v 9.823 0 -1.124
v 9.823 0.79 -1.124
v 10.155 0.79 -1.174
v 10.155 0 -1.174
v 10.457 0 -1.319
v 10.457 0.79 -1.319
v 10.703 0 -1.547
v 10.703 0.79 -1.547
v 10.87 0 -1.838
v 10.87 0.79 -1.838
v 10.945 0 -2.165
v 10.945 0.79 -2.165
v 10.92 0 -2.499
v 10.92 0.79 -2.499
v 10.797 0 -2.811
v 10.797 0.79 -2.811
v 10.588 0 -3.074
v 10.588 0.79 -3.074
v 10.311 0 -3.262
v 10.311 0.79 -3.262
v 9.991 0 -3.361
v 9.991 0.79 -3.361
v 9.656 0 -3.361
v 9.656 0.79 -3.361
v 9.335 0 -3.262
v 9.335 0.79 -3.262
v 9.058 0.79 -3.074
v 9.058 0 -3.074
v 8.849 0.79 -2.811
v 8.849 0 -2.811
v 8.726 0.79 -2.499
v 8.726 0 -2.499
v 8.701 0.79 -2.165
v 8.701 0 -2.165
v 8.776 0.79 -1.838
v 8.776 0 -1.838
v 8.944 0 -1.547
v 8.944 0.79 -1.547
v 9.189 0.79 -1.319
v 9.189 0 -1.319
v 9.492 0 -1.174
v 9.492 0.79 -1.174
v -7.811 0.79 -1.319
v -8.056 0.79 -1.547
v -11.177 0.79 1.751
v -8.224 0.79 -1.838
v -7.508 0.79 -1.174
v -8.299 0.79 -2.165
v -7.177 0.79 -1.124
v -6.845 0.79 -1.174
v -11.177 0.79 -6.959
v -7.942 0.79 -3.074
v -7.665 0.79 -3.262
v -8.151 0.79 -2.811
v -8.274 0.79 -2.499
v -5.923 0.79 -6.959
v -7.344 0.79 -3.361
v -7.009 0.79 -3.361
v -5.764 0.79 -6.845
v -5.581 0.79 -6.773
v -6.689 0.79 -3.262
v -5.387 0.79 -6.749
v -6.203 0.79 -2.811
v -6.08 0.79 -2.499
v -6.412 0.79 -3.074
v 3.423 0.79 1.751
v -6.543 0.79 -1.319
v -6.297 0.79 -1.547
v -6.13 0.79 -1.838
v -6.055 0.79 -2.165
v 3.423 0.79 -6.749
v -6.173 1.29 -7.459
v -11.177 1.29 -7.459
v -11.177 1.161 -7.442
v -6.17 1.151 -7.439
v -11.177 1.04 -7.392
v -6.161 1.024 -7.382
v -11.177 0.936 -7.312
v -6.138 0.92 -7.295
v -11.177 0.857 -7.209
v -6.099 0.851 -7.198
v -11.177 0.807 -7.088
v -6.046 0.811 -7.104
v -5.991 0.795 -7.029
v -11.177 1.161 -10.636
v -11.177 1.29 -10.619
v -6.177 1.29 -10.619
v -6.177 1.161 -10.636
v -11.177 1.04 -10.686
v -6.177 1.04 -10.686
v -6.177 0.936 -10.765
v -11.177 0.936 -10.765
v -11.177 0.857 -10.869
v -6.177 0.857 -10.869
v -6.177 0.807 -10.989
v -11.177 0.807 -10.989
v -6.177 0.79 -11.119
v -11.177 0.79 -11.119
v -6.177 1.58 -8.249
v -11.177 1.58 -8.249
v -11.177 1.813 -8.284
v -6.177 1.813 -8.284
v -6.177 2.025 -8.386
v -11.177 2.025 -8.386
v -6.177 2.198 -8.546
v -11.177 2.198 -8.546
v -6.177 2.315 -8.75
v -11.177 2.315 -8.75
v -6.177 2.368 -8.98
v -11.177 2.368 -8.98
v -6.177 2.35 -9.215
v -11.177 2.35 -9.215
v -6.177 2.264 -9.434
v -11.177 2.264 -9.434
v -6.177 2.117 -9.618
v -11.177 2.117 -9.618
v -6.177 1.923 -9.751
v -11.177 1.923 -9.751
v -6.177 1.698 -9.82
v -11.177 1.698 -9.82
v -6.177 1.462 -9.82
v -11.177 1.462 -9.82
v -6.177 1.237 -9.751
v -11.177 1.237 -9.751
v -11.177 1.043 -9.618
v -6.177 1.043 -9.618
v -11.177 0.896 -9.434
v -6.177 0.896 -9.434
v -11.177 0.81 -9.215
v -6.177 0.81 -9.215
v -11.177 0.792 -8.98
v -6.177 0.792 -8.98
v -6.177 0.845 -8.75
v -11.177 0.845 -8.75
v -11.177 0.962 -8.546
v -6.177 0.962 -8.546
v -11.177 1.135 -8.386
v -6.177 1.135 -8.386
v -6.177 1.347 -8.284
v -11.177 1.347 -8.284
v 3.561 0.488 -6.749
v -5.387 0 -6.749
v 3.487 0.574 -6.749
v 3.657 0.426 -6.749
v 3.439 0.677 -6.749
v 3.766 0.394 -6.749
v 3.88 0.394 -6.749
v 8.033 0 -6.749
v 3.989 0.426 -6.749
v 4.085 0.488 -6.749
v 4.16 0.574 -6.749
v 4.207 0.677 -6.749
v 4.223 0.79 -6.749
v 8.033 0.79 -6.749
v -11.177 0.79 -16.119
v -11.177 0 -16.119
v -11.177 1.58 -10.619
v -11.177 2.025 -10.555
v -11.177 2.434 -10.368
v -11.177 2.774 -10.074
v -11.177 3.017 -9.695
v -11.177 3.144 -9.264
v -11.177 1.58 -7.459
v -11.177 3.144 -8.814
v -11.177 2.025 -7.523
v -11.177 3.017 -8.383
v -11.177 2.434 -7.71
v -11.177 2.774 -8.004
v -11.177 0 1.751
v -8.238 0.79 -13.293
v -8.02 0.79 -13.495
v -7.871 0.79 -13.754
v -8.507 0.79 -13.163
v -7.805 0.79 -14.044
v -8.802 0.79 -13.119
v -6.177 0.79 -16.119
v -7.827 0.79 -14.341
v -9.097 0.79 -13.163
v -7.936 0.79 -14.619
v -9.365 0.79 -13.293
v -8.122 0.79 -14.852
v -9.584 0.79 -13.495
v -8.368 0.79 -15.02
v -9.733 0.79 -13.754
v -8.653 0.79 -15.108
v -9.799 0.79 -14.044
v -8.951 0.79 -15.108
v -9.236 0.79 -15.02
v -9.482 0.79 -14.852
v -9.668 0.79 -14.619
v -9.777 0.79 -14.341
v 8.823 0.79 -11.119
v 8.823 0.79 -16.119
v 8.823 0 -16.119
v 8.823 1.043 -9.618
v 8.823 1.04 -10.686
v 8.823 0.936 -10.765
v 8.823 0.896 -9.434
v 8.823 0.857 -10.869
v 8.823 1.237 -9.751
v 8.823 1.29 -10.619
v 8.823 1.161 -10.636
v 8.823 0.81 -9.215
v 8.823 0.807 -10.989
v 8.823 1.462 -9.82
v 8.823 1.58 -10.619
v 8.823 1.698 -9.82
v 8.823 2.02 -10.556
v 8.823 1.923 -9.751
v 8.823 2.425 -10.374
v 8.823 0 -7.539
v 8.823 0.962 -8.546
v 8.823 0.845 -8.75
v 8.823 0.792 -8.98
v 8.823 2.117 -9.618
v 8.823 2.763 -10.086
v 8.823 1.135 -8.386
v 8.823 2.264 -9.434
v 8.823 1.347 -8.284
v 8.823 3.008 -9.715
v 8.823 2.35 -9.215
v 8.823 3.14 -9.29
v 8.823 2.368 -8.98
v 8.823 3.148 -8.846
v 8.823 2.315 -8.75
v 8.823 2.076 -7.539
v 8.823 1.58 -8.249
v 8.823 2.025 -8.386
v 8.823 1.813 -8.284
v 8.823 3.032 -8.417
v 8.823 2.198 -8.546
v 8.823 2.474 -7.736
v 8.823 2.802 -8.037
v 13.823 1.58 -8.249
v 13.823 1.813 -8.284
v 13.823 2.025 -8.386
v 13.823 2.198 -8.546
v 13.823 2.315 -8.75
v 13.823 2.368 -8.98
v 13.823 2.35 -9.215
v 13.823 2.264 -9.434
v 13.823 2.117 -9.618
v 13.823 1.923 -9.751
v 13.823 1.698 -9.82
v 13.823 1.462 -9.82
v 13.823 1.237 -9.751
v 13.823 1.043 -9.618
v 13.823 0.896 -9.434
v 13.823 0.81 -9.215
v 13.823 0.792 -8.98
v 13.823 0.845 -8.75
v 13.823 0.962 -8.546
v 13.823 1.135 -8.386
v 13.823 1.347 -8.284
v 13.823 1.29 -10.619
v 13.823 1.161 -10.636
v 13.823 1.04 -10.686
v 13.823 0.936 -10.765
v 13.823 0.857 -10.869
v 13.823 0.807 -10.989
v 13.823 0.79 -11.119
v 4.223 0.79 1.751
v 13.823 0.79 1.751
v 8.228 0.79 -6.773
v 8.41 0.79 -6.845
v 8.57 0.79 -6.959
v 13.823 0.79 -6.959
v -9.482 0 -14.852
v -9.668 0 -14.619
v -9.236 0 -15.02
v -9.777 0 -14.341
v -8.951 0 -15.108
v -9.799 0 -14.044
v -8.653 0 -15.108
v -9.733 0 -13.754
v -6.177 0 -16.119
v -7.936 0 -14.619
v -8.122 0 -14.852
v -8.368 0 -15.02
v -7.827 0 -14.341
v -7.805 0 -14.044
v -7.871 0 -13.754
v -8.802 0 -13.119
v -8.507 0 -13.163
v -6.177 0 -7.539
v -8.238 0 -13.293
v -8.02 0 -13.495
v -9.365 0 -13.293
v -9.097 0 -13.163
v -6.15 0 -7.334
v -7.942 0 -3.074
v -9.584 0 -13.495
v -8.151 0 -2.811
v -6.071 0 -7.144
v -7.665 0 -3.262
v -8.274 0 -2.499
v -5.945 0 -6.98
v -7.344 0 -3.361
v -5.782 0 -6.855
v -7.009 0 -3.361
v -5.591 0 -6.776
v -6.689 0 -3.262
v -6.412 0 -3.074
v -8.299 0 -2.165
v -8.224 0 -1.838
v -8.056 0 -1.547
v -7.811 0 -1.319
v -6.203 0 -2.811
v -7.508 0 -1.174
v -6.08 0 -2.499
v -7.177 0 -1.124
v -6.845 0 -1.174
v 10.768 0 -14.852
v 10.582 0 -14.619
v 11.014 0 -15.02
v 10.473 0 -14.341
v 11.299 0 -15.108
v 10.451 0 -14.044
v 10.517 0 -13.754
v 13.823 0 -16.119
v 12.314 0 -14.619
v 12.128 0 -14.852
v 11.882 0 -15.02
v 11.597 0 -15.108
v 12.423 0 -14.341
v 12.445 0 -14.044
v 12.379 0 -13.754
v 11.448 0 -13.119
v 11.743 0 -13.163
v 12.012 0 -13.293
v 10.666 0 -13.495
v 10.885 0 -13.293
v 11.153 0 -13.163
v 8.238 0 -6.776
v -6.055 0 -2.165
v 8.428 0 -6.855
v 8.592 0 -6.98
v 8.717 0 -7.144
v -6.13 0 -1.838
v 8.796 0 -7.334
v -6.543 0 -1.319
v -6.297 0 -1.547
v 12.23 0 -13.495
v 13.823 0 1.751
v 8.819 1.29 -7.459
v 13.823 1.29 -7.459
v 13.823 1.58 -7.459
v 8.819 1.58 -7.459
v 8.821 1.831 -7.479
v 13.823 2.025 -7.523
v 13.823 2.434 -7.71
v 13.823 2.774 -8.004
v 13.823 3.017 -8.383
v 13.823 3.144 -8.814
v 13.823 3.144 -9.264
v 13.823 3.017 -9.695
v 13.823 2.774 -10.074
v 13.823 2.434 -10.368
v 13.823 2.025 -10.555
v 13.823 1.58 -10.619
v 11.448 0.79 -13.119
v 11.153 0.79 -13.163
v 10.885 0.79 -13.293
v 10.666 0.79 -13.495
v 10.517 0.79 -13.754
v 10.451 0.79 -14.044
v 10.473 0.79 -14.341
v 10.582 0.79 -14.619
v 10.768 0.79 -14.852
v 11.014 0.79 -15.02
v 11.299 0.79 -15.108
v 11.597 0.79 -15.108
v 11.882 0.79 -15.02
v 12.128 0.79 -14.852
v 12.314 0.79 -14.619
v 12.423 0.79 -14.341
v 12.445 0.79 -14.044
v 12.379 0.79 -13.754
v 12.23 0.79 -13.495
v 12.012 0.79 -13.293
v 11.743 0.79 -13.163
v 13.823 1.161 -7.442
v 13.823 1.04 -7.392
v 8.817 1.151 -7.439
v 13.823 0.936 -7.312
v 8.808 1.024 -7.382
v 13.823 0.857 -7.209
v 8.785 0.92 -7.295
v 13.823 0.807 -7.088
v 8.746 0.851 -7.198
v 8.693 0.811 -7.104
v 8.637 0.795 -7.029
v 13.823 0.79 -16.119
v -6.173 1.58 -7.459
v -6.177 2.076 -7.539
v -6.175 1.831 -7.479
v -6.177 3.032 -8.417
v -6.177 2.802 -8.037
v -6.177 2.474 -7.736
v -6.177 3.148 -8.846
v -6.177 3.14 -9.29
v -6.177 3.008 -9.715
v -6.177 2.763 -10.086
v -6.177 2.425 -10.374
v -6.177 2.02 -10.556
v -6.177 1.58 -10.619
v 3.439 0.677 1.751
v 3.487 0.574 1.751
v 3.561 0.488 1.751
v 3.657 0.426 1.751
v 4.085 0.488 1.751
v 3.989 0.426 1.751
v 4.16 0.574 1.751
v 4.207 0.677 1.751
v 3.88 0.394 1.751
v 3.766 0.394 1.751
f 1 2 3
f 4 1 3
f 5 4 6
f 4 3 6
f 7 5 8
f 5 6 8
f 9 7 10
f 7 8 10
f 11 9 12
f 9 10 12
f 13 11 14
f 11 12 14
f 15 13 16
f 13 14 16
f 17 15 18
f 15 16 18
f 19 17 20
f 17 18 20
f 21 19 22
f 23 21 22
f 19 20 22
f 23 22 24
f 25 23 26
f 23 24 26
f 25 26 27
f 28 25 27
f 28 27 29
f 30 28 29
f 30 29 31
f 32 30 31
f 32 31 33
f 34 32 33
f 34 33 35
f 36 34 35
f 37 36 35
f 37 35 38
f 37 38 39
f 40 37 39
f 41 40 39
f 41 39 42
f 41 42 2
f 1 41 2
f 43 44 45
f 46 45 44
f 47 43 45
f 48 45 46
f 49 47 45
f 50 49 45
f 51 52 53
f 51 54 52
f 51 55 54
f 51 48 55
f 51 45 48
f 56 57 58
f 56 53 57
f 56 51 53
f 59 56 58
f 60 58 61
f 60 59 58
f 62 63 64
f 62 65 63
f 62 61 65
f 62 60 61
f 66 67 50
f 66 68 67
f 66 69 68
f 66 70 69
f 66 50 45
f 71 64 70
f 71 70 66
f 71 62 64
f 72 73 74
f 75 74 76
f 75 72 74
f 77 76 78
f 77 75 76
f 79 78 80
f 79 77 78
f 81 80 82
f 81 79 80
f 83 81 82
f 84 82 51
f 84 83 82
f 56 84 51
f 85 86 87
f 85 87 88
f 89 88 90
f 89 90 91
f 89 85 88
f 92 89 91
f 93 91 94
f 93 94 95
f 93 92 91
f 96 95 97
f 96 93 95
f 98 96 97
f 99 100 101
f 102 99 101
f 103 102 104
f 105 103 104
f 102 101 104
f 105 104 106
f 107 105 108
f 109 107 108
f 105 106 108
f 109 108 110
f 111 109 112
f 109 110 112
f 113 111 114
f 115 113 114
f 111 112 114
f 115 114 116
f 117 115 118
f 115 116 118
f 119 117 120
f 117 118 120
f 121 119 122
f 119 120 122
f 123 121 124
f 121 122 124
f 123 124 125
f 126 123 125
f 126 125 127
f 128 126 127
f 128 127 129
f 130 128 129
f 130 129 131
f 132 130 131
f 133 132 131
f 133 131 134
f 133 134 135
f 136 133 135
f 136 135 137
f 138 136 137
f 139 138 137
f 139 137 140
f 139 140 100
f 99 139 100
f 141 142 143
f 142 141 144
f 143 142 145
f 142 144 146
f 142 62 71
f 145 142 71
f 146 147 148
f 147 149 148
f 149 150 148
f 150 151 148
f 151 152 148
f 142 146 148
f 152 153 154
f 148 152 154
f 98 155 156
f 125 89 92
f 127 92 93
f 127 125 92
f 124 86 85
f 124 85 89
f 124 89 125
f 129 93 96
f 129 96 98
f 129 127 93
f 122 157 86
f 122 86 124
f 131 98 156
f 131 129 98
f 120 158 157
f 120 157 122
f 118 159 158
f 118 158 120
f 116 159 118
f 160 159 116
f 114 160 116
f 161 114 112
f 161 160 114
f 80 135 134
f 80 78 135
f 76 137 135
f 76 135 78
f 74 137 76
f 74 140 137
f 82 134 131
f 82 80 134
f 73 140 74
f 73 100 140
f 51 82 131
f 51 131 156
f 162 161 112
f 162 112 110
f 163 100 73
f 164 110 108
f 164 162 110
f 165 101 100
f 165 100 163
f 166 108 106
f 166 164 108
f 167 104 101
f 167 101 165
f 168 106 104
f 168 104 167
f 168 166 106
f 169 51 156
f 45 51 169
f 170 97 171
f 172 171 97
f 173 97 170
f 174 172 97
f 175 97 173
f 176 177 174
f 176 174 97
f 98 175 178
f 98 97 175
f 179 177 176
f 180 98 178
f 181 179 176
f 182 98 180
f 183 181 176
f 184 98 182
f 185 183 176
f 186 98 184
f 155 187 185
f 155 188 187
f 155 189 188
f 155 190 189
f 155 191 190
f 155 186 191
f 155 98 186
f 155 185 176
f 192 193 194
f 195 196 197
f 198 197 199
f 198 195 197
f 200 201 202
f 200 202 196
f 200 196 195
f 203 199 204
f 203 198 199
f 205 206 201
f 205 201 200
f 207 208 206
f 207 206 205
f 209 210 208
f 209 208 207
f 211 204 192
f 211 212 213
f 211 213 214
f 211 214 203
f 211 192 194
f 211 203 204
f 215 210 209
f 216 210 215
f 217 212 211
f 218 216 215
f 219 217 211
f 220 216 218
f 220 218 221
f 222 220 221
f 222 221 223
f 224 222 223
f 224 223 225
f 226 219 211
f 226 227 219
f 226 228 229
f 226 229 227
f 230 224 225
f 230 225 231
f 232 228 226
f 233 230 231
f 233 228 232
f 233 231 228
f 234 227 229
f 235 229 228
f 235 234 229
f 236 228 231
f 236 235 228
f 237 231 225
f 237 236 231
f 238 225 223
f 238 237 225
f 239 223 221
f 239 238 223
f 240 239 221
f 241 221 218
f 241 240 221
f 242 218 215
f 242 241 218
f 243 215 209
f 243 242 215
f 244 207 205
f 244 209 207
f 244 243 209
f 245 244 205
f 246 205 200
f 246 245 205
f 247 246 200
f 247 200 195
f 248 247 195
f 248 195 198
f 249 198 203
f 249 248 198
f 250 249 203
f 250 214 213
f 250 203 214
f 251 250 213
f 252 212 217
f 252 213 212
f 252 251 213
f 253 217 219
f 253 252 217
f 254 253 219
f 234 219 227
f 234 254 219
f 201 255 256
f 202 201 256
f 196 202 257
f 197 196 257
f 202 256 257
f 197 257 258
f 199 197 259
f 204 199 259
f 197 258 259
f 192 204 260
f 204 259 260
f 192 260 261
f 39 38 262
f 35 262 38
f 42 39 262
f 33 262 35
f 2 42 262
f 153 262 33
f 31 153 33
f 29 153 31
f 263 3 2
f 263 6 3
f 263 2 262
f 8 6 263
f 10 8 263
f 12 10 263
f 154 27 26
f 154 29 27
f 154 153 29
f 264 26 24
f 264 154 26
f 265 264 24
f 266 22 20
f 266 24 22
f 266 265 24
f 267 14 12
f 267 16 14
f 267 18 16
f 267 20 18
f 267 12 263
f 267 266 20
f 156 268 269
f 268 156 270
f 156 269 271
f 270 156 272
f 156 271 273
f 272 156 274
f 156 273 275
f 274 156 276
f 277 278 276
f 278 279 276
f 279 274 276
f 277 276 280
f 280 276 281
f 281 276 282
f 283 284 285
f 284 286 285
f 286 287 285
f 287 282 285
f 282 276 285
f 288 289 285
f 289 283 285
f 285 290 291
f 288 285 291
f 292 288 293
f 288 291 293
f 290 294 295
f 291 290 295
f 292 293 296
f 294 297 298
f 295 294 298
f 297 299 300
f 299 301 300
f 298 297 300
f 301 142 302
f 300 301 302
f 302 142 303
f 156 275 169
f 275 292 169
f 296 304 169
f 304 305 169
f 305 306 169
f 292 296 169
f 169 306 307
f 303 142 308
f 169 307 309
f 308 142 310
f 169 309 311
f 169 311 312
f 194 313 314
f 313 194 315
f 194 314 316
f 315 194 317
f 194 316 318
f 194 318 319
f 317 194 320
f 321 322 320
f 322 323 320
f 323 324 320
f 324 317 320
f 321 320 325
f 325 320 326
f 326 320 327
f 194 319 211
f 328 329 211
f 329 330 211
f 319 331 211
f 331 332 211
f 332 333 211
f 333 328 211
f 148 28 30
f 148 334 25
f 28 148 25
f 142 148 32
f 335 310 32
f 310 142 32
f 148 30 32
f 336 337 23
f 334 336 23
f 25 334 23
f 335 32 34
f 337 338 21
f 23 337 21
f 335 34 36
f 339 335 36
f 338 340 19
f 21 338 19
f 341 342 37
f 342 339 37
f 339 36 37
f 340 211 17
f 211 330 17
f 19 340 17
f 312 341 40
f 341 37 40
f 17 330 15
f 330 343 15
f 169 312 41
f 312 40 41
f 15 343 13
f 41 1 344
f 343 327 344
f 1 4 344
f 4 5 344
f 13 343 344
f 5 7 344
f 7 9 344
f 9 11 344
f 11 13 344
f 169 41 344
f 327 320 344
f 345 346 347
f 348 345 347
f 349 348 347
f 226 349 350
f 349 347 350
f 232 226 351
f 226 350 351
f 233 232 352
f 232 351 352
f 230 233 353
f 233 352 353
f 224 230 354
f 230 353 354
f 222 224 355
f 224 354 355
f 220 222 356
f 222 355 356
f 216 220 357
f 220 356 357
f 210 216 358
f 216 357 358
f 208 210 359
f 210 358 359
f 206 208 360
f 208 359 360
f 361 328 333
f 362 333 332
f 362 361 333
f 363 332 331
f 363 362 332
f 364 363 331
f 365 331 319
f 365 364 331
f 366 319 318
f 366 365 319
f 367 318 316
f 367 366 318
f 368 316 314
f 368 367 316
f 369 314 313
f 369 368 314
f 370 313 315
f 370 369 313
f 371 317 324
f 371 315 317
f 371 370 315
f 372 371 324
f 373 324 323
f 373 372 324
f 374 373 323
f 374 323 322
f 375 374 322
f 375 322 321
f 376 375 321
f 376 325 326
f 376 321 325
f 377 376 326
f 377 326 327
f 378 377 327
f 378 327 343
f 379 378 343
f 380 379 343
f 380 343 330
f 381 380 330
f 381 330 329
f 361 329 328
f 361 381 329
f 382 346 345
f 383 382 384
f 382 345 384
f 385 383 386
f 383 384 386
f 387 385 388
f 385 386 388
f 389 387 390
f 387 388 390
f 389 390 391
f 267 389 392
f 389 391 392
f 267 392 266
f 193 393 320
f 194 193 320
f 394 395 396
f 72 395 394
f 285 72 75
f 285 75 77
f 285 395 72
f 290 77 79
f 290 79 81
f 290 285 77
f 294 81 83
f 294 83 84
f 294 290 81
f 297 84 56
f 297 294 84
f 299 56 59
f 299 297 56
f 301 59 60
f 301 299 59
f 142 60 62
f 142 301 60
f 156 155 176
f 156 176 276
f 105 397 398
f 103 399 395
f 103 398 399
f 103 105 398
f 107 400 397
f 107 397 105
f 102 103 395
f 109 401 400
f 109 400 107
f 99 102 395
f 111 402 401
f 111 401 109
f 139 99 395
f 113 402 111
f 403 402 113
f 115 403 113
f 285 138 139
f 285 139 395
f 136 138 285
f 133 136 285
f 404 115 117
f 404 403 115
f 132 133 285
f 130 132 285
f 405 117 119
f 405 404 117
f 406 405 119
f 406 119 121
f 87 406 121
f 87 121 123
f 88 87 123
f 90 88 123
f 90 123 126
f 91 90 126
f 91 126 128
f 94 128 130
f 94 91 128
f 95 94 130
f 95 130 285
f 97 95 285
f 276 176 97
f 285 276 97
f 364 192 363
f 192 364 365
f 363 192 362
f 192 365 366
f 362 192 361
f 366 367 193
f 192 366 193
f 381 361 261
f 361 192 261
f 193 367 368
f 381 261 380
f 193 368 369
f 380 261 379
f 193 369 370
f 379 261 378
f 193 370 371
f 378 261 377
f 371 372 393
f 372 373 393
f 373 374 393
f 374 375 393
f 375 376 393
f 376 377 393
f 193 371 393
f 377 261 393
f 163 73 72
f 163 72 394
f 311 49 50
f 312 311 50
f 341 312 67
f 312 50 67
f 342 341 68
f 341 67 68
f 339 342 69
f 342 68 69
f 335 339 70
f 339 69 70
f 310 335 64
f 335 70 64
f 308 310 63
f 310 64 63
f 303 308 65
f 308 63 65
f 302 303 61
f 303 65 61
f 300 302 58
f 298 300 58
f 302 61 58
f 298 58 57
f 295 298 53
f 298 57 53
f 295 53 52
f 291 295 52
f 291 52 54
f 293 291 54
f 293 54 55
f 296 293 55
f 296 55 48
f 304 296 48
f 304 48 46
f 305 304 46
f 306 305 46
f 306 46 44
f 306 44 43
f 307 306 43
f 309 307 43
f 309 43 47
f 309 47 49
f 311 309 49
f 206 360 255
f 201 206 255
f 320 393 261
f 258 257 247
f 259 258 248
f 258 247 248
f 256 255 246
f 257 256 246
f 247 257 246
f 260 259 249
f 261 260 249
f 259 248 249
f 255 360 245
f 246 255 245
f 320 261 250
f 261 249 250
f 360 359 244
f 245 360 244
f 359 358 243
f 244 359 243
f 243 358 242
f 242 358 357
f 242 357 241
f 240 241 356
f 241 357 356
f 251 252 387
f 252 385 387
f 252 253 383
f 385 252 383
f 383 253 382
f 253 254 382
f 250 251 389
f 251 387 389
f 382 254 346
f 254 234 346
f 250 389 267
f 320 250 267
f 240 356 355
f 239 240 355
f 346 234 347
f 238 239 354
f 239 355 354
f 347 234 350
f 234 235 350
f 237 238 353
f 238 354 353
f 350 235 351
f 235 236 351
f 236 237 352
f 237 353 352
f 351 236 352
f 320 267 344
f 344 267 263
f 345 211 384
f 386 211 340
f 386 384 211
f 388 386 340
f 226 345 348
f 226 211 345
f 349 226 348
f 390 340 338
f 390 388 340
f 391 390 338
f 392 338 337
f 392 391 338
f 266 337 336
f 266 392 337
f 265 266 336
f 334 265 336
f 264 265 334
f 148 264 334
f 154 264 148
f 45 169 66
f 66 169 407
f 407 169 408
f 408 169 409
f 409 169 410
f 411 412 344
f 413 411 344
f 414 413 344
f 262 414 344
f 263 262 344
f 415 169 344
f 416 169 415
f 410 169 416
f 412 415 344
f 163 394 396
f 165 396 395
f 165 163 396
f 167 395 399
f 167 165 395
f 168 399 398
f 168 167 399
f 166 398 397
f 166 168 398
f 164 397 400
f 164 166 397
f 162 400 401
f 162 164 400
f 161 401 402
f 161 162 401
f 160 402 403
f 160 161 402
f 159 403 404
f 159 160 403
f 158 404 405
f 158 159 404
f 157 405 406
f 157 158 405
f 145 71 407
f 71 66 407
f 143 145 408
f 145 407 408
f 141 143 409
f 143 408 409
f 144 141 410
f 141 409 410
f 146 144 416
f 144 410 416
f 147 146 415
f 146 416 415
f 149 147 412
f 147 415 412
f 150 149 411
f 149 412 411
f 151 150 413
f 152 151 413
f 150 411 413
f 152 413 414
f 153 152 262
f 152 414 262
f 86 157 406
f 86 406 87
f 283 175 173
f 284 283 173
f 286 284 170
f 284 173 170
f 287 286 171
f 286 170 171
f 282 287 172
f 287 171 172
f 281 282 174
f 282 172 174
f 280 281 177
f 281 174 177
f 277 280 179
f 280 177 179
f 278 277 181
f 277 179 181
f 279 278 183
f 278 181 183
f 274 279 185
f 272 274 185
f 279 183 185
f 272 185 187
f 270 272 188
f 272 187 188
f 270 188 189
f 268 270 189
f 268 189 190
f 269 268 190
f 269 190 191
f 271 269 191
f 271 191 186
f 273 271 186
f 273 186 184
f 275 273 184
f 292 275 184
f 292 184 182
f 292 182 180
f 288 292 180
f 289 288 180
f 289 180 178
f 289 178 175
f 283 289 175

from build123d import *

# Parameters (mm, degrees)
SKETCH1_W                     = 25
SKETCH1_H                     = 10
BASE_PLATE_DEPTH              = 0.79
PINHOLDER_DEPTH               = 5
SKETCH4_R                     = 0.79
PIN_SHAFT_DEPTH               = 30.913269547
SKETCH5_R                     = 1.125
SCREW_HOLES_DEPTH             = 4
SKETCH11_R                    = 1
SET_SCREW_HOLE_DEPTH          = 1.5
MIRRORED_FILLETS_R            = 0.5
MIRRORED_FILLETS_OF_MIRROR1_R = 0.5
SPRING_GROOVE_DEPTH           = 1.5
FILLET2_R                     = 0.79
SKETCH9_R                     = 0.4


with BuildPart() as part:
    # Sketch1 → Base Plate (new body)
    with BuildSketch(Plane(origin=(0, 0, 0), x_dir=(1, 0, 0), z_dir=(0, 1, 0))):
        with Locations((1.323198198, 3.248873874)):
            Rectangle(SKETCH1_W, SKETCH1_H)
    extrude(amount=BASE_PLATE_DEPTH)

    # Sketch2 → PinHolder (add)
    with BuildSketch(Plane.ZY.offset(11.176801802)):
        with BuildLine():
            Line((-8.248873874, 0), (-8.248873874, 0.79))
            Line((-8.248873874, 0.79), (-7.458873874, 0.79))
            Line((-7.458873874, 0.79), (-7.458873874, 1.58))
            ThreePointArc((-7.458873874, 1.58), (-9.038873874, 3.16), (-10.618873874, 1.58))
            Line((-10.618873874, 1.58), (-10.618873874, 1.29))
            ThreePointArc((-10.618873874, 1.29), (-10.765320483, 0.936446609), (-11.118873874, 0.79))
            Line((-11.118873874, 0.79), (-16.118873874, 0.79))
            Line((-16.118873874, 0.79), (-16.118873874, 0))
            Line((-16.118873874, 0), (-11.426644498, 0))
            Line((-11.426644498, 0), (-8.248873874, 0))
        make_face()
    pinholder = extrude(amount=-PINHOLDER_DEPTH)

    # Sketch4 → Pin Shaft (cut, through all)
    with BuildSketch(Plane.ZY.offset(11.176801802)):
        with Locations((-9.038873874, 1.58)):
            Circle(SKETCH4_R)
    pin_shaft = extrude(amount=-PIN_SHAFT_DEPTH, mode=Mode.SUBTRACT)

    # Sketch5 → Screw Holes (cut)
    with BuildSketch(Plane(origin=(0, 0.79, 0), x_dir=(1, 0, 0), z_dir=(0, 1, 0))):
        with Locations(Location((-7.176801802, 2.248873874, 0), (0, 0, 270))):
            Circle(SKETCH5_R)
        with Locations(Location((9.823198198, 2.248873874, 0), (0, 0, 270))):
            Circle(SKETCH5_R)
    extrude(amount=-SCREW_HOLES_DEPTH, mode=Mode.SUBTRACT)

    # Sketch11 → Set Screw Hole (cut)
    with BuildSketch(Plane(origin=(0, 0.79, 0), x_dir=(1, 0, 0), z_dir=(0, 1, 0))):
        with Locations(Location((-8.801801802, 14.118873874, 0), (0, 0, 270))):
            Circle(SKETCH11_R)
    set_screw_hole = extrude(amount=-SET_SCREW_HOLE_DEPTH, mode=Mode.SUBTRACT)

    # Mirrored Fillets
    mirrored_fillets_edges = [part.edges().sort_by_distance(p)[0] for p in [
        (-8.676801802, 0.79, -7.458873874),
    ]]
    fillet(mirrored_fillets_edges, radius=MIRRORED_FILLETS_R)

    # Mirror1: PinHolder, Pin Shaft, Set Screw Hole across plane
    add(pinholder.mirror(Plane(origin=(1.323198198, 0, 0), x_dir=(0, 0, 1), z_dir=(1, 0, 0))))
    add(pin_shaft.mirror(Plane(origin=(1.323198198, 0, 0), x_dir=(0, 0, 1), z_dir=(1, 0, 0))), mode=Mode.SUBTRACT)
    add(set_screw_hole.mirror(Plane(origin=(1.323198198, 0, 0), x_dir=(0, 0, 1), z_dir=(1, 0, 0))), mode=Mode.SUBTRACT)

    # Mirrored Fillets of Mirror1
    mirrored_fillets_of_mirror1_edges = [part.edges().sort_by_distance(p)[0] for p in [
        (11.323198198, 0.79, -7.458873874),
    ]]
    fillet(mirrored_fillets_of_mirror1_edges, radius=MIRRORED_FILLETS_OF_MIRROR1_R)

    # Sketch10 → Spring Groove (cut)
    with BuildSketch(Plane(origin=(0, 0, -8.248873874), x_dir=(-1, 0, 0), z_dir=(0, 0, -1))):
        Polygon((-3.823198198, 0.79), (1.176801802, 0.79), (6.176801802, 0.79), (6.176801802, 0), (1.176801802, 0), (-3.823198198, 0), (-8.823198198, 0), (-8.823198198, 0.79), align=None)
    extrude(amount=-SPRING_GROOVE_DEPTH, mode=Mode.SUBTRACT)

    # Fillet2
    fillet2_edges = [part.edges().sort_by_distance(p)[0] for p in [
        (-6.176801802, 0.395, -6.748873874),
        (8.823198198, 0.395, -6.748873874),
    ]]
    fillet(fillet2_edges, radius=FILLET2_R)

    # Wire Groove: sweep along a path in Sketch8
    with BuildLine(Plane.XZ.offset(-0.79)) as wire_groove_path:
        Line((3.823198198, -8.248873874), (3.823198198, 1.751126126))
    # Sketch9 → Wire Groove (sweep, cut)
    with BuildSketch(Plane.XY.offset(1.751126126)):
        with Locations((3.823198198, 0.79)):
            Circle(SKETCH9_R)
    sweep(path=wire_groove_path.line, mode=Mode.SUBTRACT)


solid = part.part
